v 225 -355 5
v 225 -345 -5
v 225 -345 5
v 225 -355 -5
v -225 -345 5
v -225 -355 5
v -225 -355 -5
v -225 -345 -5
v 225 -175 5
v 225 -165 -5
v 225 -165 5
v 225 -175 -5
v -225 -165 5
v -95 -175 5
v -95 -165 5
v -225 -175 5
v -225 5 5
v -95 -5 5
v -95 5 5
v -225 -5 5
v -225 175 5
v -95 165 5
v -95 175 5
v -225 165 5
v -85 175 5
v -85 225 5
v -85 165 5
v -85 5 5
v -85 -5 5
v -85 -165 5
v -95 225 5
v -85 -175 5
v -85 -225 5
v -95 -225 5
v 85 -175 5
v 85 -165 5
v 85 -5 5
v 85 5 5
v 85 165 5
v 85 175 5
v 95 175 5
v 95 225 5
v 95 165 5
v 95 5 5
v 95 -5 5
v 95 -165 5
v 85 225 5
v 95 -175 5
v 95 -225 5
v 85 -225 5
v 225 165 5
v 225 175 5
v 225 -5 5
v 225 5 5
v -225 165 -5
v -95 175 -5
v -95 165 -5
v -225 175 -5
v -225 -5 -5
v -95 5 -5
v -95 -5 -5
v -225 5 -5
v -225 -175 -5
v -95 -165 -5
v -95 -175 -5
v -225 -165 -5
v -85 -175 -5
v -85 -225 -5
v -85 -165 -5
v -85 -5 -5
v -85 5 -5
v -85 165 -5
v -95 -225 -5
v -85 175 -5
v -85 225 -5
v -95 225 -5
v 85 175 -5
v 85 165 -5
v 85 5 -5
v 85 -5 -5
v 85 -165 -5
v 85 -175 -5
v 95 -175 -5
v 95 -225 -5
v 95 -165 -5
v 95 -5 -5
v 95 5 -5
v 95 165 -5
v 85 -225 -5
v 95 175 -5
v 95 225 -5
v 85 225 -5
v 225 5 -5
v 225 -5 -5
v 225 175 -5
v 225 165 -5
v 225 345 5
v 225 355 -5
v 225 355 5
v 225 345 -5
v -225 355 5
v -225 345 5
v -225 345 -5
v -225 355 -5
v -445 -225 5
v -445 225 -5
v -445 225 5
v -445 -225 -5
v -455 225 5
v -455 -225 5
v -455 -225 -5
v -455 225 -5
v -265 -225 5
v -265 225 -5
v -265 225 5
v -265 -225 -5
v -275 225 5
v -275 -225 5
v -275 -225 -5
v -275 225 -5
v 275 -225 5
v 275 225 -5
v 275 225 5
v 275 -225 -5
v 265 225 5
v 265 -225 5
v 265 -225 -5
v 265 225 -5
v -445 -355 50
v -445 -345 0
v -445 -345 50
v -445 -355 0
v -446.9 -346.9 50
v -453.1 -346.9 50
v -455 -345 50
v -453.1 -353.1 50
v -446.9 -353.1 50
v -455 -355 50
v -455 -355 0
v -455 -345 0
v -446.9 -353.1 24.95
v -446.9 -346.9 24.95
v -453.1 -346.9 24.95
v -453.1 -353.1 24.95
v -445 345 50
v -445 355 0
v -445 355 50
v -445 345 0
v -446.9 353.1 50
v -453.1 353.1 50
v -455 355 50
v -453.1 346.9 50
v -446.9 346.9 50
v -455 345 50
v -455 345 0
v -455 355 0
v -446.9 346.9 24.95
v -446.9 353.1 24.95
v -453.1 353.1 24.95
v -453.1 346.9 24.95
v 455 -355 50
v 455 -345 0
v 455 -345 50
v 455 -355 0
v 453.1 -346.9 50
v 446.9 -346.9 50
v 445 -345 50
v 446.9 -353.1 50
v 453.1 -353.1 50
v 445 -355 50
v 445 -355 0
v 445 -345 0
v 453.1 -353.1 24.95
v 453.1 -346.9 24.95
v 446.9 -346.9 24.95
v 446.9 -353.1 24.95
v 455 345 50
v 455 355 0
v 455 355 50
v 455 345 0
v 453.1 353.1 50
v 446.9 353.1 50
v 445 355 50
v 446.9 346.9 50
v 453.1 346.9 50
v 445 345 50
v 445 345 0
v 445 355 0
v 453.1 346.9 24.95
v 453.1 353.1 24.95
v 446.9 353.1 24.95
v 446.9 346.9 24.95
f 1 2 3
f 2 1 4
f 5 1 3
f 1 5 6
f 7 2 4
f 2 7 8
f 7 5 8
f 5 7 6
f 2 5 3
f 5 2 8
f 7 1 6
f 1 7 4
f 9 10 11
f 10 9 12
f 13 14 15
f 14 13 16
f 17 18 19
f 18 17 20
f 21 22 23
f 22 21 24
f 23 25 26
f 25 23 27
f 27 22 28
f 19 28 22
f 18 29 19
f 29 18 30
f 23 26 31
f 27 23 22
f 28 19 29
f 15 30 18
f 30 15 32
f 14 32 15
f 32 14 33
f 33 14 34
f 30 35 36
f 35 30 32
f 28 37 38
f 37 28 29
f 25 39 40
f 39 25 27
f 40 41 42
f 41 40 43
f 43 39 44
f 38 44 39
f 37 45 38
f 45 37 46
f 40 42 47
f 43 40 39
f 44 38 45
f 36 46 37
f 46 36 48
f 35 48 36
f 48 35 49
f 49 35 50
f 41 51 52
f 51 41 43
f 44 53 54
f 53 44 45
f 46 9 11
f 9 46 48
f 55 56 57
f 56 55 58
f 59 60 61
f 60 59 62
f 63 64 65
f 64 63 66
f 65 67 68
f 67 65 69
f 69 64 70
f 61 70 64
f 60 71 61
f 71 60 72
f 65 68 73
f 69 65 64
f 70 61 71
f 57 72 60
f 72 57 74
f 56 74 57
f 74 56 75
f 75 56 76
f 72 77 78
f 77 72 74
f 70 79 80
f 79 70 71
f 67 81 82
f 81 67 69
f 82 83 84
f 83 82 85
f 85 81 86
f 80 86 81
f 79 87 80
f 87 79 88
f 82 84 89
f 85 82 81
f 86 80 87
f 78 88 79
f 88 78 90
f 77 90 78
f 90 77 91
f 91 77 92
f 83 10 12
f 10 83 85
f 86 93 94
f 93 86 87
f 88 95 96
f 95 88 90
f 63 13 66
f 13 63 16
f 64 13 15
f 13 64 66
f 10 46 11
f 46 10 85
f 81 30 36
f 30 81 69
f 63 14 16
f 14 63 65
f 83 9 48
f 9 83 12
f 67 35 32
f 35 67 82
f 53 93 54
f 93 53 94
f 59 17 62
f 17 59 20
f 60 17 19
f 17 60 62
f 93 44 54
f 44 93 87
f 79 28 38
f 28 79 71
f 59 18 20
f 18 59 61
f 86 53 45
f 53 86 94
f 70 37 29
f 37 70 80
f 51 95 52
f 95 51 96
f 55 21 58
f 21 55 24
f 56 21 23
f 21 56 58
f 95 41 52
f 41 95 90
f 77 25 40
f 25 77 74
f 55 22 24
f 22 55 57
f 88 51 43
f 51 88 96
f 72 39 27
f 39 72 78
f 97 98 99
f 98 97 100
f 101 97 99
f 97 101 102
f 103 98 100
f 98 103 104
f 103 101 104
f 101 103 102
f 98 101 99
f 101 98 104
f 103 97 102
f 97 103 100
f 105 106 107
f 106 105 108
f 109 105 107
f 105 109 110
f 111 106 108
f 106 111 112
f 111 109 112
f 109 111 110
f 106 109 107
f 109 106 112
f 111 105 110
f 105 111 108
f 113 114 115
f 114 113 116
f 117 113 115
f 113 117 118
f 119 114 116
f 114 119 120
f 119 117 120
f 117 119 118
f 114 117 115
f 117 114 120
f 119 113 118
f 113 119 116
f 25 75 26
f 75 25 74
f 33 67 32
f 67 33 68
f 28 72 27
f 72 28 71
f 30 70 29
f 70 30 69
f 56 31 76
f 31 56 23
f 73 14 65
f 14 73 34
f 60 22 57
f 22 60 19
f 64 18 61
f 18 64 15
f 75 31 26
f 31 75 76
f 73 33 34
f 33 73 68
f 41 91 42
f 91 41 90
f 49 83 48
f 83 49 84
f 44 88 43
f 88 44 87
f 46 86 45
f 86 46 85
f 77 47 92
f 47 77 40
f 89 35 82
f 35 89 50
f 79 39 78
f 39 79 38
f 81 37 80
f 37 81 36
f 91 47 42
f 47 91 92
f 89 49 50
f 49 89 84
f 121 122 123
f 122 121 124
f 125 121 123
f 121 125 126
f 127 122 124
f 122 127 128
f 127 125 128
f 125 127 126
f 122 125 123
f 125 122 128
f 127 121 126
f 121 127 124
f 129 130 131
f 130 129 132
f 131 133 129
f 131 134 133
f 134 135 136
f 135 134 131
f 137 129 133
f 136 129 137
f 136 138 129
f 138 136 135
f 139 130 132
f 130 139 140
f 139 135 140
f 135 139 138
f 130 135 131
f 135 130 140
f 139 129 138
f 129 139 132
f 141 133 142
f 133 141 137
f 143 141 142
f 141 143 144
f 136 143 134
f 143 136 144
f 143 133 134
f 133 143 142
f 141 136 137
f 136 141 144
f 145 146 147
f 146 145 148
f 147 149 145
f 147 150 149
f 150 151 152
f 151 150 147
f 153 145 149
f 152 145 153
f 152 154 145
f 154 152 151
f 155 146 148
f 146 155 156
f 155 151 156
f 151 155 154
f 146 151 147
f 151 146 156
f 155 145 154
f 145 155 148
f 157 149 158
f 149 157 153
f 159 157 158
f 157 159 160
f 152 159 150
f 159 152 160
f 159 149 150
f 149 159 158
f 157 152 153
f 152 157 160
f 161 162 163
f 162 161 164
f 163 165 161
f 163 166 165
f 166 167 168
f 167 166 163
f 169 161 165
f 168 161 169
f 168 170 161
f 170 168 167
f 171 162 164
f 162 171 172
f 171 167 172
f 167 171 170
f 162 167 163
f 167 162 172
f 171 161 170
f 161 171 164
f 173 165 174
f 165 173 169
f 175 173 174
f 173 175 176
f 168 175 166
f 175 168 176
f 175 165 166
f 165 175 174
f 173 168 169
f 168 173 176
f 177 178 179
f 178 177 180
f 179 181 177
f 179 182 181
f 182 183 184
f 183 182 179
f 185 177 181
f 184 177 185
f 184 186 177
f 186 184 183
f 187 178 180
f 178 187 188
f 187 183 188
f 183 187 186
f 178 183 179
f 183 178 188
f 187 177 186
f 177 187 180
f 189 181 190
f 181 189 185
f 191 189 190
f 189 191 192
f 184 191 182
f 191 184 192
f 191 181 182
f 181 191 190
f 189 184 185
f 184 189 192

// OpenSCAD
// Bottom layer with full 50mm vertical stubs
module cage_layer_bottom() {
    bar_thick = 10;
    gap = 80;
    layer_h = 50;
    rod_hole = 6.2;
    
    // Bottom frame horizontal bars
    // X direction bars at Y positions
    for(y = [-175, -85, 0, 85, 175]) {
        translate([0, y*2, 0])
            cube([450, bar_thick, bar_thick], center=true);
    }
    
    // Y direction bars at X positions
    for(x = [-225, -135, -45, 45, 135]) {
        translate([x*2, 0, 0])
            cube([bar_thick, 450, bar_thick], center=true);
    }
    
    // Vertical corner stubs with rod holes (only corners)
    corners = [[-225, -175], [-225, 175], [225, -175], [225, 175]];
    for(c = corners) {
        translate([c[0]*2, c[1]*2, layer_h/2])
        difference() {
            cube([bar_thick, bar_thick, layer_h], center=true);
            translate([0, 0, layer_h/4])
                cube([rod_hole, rod_hole, layer_h/2+0.1], center=true);
        }
    }
}

cage_layer_bottom();
